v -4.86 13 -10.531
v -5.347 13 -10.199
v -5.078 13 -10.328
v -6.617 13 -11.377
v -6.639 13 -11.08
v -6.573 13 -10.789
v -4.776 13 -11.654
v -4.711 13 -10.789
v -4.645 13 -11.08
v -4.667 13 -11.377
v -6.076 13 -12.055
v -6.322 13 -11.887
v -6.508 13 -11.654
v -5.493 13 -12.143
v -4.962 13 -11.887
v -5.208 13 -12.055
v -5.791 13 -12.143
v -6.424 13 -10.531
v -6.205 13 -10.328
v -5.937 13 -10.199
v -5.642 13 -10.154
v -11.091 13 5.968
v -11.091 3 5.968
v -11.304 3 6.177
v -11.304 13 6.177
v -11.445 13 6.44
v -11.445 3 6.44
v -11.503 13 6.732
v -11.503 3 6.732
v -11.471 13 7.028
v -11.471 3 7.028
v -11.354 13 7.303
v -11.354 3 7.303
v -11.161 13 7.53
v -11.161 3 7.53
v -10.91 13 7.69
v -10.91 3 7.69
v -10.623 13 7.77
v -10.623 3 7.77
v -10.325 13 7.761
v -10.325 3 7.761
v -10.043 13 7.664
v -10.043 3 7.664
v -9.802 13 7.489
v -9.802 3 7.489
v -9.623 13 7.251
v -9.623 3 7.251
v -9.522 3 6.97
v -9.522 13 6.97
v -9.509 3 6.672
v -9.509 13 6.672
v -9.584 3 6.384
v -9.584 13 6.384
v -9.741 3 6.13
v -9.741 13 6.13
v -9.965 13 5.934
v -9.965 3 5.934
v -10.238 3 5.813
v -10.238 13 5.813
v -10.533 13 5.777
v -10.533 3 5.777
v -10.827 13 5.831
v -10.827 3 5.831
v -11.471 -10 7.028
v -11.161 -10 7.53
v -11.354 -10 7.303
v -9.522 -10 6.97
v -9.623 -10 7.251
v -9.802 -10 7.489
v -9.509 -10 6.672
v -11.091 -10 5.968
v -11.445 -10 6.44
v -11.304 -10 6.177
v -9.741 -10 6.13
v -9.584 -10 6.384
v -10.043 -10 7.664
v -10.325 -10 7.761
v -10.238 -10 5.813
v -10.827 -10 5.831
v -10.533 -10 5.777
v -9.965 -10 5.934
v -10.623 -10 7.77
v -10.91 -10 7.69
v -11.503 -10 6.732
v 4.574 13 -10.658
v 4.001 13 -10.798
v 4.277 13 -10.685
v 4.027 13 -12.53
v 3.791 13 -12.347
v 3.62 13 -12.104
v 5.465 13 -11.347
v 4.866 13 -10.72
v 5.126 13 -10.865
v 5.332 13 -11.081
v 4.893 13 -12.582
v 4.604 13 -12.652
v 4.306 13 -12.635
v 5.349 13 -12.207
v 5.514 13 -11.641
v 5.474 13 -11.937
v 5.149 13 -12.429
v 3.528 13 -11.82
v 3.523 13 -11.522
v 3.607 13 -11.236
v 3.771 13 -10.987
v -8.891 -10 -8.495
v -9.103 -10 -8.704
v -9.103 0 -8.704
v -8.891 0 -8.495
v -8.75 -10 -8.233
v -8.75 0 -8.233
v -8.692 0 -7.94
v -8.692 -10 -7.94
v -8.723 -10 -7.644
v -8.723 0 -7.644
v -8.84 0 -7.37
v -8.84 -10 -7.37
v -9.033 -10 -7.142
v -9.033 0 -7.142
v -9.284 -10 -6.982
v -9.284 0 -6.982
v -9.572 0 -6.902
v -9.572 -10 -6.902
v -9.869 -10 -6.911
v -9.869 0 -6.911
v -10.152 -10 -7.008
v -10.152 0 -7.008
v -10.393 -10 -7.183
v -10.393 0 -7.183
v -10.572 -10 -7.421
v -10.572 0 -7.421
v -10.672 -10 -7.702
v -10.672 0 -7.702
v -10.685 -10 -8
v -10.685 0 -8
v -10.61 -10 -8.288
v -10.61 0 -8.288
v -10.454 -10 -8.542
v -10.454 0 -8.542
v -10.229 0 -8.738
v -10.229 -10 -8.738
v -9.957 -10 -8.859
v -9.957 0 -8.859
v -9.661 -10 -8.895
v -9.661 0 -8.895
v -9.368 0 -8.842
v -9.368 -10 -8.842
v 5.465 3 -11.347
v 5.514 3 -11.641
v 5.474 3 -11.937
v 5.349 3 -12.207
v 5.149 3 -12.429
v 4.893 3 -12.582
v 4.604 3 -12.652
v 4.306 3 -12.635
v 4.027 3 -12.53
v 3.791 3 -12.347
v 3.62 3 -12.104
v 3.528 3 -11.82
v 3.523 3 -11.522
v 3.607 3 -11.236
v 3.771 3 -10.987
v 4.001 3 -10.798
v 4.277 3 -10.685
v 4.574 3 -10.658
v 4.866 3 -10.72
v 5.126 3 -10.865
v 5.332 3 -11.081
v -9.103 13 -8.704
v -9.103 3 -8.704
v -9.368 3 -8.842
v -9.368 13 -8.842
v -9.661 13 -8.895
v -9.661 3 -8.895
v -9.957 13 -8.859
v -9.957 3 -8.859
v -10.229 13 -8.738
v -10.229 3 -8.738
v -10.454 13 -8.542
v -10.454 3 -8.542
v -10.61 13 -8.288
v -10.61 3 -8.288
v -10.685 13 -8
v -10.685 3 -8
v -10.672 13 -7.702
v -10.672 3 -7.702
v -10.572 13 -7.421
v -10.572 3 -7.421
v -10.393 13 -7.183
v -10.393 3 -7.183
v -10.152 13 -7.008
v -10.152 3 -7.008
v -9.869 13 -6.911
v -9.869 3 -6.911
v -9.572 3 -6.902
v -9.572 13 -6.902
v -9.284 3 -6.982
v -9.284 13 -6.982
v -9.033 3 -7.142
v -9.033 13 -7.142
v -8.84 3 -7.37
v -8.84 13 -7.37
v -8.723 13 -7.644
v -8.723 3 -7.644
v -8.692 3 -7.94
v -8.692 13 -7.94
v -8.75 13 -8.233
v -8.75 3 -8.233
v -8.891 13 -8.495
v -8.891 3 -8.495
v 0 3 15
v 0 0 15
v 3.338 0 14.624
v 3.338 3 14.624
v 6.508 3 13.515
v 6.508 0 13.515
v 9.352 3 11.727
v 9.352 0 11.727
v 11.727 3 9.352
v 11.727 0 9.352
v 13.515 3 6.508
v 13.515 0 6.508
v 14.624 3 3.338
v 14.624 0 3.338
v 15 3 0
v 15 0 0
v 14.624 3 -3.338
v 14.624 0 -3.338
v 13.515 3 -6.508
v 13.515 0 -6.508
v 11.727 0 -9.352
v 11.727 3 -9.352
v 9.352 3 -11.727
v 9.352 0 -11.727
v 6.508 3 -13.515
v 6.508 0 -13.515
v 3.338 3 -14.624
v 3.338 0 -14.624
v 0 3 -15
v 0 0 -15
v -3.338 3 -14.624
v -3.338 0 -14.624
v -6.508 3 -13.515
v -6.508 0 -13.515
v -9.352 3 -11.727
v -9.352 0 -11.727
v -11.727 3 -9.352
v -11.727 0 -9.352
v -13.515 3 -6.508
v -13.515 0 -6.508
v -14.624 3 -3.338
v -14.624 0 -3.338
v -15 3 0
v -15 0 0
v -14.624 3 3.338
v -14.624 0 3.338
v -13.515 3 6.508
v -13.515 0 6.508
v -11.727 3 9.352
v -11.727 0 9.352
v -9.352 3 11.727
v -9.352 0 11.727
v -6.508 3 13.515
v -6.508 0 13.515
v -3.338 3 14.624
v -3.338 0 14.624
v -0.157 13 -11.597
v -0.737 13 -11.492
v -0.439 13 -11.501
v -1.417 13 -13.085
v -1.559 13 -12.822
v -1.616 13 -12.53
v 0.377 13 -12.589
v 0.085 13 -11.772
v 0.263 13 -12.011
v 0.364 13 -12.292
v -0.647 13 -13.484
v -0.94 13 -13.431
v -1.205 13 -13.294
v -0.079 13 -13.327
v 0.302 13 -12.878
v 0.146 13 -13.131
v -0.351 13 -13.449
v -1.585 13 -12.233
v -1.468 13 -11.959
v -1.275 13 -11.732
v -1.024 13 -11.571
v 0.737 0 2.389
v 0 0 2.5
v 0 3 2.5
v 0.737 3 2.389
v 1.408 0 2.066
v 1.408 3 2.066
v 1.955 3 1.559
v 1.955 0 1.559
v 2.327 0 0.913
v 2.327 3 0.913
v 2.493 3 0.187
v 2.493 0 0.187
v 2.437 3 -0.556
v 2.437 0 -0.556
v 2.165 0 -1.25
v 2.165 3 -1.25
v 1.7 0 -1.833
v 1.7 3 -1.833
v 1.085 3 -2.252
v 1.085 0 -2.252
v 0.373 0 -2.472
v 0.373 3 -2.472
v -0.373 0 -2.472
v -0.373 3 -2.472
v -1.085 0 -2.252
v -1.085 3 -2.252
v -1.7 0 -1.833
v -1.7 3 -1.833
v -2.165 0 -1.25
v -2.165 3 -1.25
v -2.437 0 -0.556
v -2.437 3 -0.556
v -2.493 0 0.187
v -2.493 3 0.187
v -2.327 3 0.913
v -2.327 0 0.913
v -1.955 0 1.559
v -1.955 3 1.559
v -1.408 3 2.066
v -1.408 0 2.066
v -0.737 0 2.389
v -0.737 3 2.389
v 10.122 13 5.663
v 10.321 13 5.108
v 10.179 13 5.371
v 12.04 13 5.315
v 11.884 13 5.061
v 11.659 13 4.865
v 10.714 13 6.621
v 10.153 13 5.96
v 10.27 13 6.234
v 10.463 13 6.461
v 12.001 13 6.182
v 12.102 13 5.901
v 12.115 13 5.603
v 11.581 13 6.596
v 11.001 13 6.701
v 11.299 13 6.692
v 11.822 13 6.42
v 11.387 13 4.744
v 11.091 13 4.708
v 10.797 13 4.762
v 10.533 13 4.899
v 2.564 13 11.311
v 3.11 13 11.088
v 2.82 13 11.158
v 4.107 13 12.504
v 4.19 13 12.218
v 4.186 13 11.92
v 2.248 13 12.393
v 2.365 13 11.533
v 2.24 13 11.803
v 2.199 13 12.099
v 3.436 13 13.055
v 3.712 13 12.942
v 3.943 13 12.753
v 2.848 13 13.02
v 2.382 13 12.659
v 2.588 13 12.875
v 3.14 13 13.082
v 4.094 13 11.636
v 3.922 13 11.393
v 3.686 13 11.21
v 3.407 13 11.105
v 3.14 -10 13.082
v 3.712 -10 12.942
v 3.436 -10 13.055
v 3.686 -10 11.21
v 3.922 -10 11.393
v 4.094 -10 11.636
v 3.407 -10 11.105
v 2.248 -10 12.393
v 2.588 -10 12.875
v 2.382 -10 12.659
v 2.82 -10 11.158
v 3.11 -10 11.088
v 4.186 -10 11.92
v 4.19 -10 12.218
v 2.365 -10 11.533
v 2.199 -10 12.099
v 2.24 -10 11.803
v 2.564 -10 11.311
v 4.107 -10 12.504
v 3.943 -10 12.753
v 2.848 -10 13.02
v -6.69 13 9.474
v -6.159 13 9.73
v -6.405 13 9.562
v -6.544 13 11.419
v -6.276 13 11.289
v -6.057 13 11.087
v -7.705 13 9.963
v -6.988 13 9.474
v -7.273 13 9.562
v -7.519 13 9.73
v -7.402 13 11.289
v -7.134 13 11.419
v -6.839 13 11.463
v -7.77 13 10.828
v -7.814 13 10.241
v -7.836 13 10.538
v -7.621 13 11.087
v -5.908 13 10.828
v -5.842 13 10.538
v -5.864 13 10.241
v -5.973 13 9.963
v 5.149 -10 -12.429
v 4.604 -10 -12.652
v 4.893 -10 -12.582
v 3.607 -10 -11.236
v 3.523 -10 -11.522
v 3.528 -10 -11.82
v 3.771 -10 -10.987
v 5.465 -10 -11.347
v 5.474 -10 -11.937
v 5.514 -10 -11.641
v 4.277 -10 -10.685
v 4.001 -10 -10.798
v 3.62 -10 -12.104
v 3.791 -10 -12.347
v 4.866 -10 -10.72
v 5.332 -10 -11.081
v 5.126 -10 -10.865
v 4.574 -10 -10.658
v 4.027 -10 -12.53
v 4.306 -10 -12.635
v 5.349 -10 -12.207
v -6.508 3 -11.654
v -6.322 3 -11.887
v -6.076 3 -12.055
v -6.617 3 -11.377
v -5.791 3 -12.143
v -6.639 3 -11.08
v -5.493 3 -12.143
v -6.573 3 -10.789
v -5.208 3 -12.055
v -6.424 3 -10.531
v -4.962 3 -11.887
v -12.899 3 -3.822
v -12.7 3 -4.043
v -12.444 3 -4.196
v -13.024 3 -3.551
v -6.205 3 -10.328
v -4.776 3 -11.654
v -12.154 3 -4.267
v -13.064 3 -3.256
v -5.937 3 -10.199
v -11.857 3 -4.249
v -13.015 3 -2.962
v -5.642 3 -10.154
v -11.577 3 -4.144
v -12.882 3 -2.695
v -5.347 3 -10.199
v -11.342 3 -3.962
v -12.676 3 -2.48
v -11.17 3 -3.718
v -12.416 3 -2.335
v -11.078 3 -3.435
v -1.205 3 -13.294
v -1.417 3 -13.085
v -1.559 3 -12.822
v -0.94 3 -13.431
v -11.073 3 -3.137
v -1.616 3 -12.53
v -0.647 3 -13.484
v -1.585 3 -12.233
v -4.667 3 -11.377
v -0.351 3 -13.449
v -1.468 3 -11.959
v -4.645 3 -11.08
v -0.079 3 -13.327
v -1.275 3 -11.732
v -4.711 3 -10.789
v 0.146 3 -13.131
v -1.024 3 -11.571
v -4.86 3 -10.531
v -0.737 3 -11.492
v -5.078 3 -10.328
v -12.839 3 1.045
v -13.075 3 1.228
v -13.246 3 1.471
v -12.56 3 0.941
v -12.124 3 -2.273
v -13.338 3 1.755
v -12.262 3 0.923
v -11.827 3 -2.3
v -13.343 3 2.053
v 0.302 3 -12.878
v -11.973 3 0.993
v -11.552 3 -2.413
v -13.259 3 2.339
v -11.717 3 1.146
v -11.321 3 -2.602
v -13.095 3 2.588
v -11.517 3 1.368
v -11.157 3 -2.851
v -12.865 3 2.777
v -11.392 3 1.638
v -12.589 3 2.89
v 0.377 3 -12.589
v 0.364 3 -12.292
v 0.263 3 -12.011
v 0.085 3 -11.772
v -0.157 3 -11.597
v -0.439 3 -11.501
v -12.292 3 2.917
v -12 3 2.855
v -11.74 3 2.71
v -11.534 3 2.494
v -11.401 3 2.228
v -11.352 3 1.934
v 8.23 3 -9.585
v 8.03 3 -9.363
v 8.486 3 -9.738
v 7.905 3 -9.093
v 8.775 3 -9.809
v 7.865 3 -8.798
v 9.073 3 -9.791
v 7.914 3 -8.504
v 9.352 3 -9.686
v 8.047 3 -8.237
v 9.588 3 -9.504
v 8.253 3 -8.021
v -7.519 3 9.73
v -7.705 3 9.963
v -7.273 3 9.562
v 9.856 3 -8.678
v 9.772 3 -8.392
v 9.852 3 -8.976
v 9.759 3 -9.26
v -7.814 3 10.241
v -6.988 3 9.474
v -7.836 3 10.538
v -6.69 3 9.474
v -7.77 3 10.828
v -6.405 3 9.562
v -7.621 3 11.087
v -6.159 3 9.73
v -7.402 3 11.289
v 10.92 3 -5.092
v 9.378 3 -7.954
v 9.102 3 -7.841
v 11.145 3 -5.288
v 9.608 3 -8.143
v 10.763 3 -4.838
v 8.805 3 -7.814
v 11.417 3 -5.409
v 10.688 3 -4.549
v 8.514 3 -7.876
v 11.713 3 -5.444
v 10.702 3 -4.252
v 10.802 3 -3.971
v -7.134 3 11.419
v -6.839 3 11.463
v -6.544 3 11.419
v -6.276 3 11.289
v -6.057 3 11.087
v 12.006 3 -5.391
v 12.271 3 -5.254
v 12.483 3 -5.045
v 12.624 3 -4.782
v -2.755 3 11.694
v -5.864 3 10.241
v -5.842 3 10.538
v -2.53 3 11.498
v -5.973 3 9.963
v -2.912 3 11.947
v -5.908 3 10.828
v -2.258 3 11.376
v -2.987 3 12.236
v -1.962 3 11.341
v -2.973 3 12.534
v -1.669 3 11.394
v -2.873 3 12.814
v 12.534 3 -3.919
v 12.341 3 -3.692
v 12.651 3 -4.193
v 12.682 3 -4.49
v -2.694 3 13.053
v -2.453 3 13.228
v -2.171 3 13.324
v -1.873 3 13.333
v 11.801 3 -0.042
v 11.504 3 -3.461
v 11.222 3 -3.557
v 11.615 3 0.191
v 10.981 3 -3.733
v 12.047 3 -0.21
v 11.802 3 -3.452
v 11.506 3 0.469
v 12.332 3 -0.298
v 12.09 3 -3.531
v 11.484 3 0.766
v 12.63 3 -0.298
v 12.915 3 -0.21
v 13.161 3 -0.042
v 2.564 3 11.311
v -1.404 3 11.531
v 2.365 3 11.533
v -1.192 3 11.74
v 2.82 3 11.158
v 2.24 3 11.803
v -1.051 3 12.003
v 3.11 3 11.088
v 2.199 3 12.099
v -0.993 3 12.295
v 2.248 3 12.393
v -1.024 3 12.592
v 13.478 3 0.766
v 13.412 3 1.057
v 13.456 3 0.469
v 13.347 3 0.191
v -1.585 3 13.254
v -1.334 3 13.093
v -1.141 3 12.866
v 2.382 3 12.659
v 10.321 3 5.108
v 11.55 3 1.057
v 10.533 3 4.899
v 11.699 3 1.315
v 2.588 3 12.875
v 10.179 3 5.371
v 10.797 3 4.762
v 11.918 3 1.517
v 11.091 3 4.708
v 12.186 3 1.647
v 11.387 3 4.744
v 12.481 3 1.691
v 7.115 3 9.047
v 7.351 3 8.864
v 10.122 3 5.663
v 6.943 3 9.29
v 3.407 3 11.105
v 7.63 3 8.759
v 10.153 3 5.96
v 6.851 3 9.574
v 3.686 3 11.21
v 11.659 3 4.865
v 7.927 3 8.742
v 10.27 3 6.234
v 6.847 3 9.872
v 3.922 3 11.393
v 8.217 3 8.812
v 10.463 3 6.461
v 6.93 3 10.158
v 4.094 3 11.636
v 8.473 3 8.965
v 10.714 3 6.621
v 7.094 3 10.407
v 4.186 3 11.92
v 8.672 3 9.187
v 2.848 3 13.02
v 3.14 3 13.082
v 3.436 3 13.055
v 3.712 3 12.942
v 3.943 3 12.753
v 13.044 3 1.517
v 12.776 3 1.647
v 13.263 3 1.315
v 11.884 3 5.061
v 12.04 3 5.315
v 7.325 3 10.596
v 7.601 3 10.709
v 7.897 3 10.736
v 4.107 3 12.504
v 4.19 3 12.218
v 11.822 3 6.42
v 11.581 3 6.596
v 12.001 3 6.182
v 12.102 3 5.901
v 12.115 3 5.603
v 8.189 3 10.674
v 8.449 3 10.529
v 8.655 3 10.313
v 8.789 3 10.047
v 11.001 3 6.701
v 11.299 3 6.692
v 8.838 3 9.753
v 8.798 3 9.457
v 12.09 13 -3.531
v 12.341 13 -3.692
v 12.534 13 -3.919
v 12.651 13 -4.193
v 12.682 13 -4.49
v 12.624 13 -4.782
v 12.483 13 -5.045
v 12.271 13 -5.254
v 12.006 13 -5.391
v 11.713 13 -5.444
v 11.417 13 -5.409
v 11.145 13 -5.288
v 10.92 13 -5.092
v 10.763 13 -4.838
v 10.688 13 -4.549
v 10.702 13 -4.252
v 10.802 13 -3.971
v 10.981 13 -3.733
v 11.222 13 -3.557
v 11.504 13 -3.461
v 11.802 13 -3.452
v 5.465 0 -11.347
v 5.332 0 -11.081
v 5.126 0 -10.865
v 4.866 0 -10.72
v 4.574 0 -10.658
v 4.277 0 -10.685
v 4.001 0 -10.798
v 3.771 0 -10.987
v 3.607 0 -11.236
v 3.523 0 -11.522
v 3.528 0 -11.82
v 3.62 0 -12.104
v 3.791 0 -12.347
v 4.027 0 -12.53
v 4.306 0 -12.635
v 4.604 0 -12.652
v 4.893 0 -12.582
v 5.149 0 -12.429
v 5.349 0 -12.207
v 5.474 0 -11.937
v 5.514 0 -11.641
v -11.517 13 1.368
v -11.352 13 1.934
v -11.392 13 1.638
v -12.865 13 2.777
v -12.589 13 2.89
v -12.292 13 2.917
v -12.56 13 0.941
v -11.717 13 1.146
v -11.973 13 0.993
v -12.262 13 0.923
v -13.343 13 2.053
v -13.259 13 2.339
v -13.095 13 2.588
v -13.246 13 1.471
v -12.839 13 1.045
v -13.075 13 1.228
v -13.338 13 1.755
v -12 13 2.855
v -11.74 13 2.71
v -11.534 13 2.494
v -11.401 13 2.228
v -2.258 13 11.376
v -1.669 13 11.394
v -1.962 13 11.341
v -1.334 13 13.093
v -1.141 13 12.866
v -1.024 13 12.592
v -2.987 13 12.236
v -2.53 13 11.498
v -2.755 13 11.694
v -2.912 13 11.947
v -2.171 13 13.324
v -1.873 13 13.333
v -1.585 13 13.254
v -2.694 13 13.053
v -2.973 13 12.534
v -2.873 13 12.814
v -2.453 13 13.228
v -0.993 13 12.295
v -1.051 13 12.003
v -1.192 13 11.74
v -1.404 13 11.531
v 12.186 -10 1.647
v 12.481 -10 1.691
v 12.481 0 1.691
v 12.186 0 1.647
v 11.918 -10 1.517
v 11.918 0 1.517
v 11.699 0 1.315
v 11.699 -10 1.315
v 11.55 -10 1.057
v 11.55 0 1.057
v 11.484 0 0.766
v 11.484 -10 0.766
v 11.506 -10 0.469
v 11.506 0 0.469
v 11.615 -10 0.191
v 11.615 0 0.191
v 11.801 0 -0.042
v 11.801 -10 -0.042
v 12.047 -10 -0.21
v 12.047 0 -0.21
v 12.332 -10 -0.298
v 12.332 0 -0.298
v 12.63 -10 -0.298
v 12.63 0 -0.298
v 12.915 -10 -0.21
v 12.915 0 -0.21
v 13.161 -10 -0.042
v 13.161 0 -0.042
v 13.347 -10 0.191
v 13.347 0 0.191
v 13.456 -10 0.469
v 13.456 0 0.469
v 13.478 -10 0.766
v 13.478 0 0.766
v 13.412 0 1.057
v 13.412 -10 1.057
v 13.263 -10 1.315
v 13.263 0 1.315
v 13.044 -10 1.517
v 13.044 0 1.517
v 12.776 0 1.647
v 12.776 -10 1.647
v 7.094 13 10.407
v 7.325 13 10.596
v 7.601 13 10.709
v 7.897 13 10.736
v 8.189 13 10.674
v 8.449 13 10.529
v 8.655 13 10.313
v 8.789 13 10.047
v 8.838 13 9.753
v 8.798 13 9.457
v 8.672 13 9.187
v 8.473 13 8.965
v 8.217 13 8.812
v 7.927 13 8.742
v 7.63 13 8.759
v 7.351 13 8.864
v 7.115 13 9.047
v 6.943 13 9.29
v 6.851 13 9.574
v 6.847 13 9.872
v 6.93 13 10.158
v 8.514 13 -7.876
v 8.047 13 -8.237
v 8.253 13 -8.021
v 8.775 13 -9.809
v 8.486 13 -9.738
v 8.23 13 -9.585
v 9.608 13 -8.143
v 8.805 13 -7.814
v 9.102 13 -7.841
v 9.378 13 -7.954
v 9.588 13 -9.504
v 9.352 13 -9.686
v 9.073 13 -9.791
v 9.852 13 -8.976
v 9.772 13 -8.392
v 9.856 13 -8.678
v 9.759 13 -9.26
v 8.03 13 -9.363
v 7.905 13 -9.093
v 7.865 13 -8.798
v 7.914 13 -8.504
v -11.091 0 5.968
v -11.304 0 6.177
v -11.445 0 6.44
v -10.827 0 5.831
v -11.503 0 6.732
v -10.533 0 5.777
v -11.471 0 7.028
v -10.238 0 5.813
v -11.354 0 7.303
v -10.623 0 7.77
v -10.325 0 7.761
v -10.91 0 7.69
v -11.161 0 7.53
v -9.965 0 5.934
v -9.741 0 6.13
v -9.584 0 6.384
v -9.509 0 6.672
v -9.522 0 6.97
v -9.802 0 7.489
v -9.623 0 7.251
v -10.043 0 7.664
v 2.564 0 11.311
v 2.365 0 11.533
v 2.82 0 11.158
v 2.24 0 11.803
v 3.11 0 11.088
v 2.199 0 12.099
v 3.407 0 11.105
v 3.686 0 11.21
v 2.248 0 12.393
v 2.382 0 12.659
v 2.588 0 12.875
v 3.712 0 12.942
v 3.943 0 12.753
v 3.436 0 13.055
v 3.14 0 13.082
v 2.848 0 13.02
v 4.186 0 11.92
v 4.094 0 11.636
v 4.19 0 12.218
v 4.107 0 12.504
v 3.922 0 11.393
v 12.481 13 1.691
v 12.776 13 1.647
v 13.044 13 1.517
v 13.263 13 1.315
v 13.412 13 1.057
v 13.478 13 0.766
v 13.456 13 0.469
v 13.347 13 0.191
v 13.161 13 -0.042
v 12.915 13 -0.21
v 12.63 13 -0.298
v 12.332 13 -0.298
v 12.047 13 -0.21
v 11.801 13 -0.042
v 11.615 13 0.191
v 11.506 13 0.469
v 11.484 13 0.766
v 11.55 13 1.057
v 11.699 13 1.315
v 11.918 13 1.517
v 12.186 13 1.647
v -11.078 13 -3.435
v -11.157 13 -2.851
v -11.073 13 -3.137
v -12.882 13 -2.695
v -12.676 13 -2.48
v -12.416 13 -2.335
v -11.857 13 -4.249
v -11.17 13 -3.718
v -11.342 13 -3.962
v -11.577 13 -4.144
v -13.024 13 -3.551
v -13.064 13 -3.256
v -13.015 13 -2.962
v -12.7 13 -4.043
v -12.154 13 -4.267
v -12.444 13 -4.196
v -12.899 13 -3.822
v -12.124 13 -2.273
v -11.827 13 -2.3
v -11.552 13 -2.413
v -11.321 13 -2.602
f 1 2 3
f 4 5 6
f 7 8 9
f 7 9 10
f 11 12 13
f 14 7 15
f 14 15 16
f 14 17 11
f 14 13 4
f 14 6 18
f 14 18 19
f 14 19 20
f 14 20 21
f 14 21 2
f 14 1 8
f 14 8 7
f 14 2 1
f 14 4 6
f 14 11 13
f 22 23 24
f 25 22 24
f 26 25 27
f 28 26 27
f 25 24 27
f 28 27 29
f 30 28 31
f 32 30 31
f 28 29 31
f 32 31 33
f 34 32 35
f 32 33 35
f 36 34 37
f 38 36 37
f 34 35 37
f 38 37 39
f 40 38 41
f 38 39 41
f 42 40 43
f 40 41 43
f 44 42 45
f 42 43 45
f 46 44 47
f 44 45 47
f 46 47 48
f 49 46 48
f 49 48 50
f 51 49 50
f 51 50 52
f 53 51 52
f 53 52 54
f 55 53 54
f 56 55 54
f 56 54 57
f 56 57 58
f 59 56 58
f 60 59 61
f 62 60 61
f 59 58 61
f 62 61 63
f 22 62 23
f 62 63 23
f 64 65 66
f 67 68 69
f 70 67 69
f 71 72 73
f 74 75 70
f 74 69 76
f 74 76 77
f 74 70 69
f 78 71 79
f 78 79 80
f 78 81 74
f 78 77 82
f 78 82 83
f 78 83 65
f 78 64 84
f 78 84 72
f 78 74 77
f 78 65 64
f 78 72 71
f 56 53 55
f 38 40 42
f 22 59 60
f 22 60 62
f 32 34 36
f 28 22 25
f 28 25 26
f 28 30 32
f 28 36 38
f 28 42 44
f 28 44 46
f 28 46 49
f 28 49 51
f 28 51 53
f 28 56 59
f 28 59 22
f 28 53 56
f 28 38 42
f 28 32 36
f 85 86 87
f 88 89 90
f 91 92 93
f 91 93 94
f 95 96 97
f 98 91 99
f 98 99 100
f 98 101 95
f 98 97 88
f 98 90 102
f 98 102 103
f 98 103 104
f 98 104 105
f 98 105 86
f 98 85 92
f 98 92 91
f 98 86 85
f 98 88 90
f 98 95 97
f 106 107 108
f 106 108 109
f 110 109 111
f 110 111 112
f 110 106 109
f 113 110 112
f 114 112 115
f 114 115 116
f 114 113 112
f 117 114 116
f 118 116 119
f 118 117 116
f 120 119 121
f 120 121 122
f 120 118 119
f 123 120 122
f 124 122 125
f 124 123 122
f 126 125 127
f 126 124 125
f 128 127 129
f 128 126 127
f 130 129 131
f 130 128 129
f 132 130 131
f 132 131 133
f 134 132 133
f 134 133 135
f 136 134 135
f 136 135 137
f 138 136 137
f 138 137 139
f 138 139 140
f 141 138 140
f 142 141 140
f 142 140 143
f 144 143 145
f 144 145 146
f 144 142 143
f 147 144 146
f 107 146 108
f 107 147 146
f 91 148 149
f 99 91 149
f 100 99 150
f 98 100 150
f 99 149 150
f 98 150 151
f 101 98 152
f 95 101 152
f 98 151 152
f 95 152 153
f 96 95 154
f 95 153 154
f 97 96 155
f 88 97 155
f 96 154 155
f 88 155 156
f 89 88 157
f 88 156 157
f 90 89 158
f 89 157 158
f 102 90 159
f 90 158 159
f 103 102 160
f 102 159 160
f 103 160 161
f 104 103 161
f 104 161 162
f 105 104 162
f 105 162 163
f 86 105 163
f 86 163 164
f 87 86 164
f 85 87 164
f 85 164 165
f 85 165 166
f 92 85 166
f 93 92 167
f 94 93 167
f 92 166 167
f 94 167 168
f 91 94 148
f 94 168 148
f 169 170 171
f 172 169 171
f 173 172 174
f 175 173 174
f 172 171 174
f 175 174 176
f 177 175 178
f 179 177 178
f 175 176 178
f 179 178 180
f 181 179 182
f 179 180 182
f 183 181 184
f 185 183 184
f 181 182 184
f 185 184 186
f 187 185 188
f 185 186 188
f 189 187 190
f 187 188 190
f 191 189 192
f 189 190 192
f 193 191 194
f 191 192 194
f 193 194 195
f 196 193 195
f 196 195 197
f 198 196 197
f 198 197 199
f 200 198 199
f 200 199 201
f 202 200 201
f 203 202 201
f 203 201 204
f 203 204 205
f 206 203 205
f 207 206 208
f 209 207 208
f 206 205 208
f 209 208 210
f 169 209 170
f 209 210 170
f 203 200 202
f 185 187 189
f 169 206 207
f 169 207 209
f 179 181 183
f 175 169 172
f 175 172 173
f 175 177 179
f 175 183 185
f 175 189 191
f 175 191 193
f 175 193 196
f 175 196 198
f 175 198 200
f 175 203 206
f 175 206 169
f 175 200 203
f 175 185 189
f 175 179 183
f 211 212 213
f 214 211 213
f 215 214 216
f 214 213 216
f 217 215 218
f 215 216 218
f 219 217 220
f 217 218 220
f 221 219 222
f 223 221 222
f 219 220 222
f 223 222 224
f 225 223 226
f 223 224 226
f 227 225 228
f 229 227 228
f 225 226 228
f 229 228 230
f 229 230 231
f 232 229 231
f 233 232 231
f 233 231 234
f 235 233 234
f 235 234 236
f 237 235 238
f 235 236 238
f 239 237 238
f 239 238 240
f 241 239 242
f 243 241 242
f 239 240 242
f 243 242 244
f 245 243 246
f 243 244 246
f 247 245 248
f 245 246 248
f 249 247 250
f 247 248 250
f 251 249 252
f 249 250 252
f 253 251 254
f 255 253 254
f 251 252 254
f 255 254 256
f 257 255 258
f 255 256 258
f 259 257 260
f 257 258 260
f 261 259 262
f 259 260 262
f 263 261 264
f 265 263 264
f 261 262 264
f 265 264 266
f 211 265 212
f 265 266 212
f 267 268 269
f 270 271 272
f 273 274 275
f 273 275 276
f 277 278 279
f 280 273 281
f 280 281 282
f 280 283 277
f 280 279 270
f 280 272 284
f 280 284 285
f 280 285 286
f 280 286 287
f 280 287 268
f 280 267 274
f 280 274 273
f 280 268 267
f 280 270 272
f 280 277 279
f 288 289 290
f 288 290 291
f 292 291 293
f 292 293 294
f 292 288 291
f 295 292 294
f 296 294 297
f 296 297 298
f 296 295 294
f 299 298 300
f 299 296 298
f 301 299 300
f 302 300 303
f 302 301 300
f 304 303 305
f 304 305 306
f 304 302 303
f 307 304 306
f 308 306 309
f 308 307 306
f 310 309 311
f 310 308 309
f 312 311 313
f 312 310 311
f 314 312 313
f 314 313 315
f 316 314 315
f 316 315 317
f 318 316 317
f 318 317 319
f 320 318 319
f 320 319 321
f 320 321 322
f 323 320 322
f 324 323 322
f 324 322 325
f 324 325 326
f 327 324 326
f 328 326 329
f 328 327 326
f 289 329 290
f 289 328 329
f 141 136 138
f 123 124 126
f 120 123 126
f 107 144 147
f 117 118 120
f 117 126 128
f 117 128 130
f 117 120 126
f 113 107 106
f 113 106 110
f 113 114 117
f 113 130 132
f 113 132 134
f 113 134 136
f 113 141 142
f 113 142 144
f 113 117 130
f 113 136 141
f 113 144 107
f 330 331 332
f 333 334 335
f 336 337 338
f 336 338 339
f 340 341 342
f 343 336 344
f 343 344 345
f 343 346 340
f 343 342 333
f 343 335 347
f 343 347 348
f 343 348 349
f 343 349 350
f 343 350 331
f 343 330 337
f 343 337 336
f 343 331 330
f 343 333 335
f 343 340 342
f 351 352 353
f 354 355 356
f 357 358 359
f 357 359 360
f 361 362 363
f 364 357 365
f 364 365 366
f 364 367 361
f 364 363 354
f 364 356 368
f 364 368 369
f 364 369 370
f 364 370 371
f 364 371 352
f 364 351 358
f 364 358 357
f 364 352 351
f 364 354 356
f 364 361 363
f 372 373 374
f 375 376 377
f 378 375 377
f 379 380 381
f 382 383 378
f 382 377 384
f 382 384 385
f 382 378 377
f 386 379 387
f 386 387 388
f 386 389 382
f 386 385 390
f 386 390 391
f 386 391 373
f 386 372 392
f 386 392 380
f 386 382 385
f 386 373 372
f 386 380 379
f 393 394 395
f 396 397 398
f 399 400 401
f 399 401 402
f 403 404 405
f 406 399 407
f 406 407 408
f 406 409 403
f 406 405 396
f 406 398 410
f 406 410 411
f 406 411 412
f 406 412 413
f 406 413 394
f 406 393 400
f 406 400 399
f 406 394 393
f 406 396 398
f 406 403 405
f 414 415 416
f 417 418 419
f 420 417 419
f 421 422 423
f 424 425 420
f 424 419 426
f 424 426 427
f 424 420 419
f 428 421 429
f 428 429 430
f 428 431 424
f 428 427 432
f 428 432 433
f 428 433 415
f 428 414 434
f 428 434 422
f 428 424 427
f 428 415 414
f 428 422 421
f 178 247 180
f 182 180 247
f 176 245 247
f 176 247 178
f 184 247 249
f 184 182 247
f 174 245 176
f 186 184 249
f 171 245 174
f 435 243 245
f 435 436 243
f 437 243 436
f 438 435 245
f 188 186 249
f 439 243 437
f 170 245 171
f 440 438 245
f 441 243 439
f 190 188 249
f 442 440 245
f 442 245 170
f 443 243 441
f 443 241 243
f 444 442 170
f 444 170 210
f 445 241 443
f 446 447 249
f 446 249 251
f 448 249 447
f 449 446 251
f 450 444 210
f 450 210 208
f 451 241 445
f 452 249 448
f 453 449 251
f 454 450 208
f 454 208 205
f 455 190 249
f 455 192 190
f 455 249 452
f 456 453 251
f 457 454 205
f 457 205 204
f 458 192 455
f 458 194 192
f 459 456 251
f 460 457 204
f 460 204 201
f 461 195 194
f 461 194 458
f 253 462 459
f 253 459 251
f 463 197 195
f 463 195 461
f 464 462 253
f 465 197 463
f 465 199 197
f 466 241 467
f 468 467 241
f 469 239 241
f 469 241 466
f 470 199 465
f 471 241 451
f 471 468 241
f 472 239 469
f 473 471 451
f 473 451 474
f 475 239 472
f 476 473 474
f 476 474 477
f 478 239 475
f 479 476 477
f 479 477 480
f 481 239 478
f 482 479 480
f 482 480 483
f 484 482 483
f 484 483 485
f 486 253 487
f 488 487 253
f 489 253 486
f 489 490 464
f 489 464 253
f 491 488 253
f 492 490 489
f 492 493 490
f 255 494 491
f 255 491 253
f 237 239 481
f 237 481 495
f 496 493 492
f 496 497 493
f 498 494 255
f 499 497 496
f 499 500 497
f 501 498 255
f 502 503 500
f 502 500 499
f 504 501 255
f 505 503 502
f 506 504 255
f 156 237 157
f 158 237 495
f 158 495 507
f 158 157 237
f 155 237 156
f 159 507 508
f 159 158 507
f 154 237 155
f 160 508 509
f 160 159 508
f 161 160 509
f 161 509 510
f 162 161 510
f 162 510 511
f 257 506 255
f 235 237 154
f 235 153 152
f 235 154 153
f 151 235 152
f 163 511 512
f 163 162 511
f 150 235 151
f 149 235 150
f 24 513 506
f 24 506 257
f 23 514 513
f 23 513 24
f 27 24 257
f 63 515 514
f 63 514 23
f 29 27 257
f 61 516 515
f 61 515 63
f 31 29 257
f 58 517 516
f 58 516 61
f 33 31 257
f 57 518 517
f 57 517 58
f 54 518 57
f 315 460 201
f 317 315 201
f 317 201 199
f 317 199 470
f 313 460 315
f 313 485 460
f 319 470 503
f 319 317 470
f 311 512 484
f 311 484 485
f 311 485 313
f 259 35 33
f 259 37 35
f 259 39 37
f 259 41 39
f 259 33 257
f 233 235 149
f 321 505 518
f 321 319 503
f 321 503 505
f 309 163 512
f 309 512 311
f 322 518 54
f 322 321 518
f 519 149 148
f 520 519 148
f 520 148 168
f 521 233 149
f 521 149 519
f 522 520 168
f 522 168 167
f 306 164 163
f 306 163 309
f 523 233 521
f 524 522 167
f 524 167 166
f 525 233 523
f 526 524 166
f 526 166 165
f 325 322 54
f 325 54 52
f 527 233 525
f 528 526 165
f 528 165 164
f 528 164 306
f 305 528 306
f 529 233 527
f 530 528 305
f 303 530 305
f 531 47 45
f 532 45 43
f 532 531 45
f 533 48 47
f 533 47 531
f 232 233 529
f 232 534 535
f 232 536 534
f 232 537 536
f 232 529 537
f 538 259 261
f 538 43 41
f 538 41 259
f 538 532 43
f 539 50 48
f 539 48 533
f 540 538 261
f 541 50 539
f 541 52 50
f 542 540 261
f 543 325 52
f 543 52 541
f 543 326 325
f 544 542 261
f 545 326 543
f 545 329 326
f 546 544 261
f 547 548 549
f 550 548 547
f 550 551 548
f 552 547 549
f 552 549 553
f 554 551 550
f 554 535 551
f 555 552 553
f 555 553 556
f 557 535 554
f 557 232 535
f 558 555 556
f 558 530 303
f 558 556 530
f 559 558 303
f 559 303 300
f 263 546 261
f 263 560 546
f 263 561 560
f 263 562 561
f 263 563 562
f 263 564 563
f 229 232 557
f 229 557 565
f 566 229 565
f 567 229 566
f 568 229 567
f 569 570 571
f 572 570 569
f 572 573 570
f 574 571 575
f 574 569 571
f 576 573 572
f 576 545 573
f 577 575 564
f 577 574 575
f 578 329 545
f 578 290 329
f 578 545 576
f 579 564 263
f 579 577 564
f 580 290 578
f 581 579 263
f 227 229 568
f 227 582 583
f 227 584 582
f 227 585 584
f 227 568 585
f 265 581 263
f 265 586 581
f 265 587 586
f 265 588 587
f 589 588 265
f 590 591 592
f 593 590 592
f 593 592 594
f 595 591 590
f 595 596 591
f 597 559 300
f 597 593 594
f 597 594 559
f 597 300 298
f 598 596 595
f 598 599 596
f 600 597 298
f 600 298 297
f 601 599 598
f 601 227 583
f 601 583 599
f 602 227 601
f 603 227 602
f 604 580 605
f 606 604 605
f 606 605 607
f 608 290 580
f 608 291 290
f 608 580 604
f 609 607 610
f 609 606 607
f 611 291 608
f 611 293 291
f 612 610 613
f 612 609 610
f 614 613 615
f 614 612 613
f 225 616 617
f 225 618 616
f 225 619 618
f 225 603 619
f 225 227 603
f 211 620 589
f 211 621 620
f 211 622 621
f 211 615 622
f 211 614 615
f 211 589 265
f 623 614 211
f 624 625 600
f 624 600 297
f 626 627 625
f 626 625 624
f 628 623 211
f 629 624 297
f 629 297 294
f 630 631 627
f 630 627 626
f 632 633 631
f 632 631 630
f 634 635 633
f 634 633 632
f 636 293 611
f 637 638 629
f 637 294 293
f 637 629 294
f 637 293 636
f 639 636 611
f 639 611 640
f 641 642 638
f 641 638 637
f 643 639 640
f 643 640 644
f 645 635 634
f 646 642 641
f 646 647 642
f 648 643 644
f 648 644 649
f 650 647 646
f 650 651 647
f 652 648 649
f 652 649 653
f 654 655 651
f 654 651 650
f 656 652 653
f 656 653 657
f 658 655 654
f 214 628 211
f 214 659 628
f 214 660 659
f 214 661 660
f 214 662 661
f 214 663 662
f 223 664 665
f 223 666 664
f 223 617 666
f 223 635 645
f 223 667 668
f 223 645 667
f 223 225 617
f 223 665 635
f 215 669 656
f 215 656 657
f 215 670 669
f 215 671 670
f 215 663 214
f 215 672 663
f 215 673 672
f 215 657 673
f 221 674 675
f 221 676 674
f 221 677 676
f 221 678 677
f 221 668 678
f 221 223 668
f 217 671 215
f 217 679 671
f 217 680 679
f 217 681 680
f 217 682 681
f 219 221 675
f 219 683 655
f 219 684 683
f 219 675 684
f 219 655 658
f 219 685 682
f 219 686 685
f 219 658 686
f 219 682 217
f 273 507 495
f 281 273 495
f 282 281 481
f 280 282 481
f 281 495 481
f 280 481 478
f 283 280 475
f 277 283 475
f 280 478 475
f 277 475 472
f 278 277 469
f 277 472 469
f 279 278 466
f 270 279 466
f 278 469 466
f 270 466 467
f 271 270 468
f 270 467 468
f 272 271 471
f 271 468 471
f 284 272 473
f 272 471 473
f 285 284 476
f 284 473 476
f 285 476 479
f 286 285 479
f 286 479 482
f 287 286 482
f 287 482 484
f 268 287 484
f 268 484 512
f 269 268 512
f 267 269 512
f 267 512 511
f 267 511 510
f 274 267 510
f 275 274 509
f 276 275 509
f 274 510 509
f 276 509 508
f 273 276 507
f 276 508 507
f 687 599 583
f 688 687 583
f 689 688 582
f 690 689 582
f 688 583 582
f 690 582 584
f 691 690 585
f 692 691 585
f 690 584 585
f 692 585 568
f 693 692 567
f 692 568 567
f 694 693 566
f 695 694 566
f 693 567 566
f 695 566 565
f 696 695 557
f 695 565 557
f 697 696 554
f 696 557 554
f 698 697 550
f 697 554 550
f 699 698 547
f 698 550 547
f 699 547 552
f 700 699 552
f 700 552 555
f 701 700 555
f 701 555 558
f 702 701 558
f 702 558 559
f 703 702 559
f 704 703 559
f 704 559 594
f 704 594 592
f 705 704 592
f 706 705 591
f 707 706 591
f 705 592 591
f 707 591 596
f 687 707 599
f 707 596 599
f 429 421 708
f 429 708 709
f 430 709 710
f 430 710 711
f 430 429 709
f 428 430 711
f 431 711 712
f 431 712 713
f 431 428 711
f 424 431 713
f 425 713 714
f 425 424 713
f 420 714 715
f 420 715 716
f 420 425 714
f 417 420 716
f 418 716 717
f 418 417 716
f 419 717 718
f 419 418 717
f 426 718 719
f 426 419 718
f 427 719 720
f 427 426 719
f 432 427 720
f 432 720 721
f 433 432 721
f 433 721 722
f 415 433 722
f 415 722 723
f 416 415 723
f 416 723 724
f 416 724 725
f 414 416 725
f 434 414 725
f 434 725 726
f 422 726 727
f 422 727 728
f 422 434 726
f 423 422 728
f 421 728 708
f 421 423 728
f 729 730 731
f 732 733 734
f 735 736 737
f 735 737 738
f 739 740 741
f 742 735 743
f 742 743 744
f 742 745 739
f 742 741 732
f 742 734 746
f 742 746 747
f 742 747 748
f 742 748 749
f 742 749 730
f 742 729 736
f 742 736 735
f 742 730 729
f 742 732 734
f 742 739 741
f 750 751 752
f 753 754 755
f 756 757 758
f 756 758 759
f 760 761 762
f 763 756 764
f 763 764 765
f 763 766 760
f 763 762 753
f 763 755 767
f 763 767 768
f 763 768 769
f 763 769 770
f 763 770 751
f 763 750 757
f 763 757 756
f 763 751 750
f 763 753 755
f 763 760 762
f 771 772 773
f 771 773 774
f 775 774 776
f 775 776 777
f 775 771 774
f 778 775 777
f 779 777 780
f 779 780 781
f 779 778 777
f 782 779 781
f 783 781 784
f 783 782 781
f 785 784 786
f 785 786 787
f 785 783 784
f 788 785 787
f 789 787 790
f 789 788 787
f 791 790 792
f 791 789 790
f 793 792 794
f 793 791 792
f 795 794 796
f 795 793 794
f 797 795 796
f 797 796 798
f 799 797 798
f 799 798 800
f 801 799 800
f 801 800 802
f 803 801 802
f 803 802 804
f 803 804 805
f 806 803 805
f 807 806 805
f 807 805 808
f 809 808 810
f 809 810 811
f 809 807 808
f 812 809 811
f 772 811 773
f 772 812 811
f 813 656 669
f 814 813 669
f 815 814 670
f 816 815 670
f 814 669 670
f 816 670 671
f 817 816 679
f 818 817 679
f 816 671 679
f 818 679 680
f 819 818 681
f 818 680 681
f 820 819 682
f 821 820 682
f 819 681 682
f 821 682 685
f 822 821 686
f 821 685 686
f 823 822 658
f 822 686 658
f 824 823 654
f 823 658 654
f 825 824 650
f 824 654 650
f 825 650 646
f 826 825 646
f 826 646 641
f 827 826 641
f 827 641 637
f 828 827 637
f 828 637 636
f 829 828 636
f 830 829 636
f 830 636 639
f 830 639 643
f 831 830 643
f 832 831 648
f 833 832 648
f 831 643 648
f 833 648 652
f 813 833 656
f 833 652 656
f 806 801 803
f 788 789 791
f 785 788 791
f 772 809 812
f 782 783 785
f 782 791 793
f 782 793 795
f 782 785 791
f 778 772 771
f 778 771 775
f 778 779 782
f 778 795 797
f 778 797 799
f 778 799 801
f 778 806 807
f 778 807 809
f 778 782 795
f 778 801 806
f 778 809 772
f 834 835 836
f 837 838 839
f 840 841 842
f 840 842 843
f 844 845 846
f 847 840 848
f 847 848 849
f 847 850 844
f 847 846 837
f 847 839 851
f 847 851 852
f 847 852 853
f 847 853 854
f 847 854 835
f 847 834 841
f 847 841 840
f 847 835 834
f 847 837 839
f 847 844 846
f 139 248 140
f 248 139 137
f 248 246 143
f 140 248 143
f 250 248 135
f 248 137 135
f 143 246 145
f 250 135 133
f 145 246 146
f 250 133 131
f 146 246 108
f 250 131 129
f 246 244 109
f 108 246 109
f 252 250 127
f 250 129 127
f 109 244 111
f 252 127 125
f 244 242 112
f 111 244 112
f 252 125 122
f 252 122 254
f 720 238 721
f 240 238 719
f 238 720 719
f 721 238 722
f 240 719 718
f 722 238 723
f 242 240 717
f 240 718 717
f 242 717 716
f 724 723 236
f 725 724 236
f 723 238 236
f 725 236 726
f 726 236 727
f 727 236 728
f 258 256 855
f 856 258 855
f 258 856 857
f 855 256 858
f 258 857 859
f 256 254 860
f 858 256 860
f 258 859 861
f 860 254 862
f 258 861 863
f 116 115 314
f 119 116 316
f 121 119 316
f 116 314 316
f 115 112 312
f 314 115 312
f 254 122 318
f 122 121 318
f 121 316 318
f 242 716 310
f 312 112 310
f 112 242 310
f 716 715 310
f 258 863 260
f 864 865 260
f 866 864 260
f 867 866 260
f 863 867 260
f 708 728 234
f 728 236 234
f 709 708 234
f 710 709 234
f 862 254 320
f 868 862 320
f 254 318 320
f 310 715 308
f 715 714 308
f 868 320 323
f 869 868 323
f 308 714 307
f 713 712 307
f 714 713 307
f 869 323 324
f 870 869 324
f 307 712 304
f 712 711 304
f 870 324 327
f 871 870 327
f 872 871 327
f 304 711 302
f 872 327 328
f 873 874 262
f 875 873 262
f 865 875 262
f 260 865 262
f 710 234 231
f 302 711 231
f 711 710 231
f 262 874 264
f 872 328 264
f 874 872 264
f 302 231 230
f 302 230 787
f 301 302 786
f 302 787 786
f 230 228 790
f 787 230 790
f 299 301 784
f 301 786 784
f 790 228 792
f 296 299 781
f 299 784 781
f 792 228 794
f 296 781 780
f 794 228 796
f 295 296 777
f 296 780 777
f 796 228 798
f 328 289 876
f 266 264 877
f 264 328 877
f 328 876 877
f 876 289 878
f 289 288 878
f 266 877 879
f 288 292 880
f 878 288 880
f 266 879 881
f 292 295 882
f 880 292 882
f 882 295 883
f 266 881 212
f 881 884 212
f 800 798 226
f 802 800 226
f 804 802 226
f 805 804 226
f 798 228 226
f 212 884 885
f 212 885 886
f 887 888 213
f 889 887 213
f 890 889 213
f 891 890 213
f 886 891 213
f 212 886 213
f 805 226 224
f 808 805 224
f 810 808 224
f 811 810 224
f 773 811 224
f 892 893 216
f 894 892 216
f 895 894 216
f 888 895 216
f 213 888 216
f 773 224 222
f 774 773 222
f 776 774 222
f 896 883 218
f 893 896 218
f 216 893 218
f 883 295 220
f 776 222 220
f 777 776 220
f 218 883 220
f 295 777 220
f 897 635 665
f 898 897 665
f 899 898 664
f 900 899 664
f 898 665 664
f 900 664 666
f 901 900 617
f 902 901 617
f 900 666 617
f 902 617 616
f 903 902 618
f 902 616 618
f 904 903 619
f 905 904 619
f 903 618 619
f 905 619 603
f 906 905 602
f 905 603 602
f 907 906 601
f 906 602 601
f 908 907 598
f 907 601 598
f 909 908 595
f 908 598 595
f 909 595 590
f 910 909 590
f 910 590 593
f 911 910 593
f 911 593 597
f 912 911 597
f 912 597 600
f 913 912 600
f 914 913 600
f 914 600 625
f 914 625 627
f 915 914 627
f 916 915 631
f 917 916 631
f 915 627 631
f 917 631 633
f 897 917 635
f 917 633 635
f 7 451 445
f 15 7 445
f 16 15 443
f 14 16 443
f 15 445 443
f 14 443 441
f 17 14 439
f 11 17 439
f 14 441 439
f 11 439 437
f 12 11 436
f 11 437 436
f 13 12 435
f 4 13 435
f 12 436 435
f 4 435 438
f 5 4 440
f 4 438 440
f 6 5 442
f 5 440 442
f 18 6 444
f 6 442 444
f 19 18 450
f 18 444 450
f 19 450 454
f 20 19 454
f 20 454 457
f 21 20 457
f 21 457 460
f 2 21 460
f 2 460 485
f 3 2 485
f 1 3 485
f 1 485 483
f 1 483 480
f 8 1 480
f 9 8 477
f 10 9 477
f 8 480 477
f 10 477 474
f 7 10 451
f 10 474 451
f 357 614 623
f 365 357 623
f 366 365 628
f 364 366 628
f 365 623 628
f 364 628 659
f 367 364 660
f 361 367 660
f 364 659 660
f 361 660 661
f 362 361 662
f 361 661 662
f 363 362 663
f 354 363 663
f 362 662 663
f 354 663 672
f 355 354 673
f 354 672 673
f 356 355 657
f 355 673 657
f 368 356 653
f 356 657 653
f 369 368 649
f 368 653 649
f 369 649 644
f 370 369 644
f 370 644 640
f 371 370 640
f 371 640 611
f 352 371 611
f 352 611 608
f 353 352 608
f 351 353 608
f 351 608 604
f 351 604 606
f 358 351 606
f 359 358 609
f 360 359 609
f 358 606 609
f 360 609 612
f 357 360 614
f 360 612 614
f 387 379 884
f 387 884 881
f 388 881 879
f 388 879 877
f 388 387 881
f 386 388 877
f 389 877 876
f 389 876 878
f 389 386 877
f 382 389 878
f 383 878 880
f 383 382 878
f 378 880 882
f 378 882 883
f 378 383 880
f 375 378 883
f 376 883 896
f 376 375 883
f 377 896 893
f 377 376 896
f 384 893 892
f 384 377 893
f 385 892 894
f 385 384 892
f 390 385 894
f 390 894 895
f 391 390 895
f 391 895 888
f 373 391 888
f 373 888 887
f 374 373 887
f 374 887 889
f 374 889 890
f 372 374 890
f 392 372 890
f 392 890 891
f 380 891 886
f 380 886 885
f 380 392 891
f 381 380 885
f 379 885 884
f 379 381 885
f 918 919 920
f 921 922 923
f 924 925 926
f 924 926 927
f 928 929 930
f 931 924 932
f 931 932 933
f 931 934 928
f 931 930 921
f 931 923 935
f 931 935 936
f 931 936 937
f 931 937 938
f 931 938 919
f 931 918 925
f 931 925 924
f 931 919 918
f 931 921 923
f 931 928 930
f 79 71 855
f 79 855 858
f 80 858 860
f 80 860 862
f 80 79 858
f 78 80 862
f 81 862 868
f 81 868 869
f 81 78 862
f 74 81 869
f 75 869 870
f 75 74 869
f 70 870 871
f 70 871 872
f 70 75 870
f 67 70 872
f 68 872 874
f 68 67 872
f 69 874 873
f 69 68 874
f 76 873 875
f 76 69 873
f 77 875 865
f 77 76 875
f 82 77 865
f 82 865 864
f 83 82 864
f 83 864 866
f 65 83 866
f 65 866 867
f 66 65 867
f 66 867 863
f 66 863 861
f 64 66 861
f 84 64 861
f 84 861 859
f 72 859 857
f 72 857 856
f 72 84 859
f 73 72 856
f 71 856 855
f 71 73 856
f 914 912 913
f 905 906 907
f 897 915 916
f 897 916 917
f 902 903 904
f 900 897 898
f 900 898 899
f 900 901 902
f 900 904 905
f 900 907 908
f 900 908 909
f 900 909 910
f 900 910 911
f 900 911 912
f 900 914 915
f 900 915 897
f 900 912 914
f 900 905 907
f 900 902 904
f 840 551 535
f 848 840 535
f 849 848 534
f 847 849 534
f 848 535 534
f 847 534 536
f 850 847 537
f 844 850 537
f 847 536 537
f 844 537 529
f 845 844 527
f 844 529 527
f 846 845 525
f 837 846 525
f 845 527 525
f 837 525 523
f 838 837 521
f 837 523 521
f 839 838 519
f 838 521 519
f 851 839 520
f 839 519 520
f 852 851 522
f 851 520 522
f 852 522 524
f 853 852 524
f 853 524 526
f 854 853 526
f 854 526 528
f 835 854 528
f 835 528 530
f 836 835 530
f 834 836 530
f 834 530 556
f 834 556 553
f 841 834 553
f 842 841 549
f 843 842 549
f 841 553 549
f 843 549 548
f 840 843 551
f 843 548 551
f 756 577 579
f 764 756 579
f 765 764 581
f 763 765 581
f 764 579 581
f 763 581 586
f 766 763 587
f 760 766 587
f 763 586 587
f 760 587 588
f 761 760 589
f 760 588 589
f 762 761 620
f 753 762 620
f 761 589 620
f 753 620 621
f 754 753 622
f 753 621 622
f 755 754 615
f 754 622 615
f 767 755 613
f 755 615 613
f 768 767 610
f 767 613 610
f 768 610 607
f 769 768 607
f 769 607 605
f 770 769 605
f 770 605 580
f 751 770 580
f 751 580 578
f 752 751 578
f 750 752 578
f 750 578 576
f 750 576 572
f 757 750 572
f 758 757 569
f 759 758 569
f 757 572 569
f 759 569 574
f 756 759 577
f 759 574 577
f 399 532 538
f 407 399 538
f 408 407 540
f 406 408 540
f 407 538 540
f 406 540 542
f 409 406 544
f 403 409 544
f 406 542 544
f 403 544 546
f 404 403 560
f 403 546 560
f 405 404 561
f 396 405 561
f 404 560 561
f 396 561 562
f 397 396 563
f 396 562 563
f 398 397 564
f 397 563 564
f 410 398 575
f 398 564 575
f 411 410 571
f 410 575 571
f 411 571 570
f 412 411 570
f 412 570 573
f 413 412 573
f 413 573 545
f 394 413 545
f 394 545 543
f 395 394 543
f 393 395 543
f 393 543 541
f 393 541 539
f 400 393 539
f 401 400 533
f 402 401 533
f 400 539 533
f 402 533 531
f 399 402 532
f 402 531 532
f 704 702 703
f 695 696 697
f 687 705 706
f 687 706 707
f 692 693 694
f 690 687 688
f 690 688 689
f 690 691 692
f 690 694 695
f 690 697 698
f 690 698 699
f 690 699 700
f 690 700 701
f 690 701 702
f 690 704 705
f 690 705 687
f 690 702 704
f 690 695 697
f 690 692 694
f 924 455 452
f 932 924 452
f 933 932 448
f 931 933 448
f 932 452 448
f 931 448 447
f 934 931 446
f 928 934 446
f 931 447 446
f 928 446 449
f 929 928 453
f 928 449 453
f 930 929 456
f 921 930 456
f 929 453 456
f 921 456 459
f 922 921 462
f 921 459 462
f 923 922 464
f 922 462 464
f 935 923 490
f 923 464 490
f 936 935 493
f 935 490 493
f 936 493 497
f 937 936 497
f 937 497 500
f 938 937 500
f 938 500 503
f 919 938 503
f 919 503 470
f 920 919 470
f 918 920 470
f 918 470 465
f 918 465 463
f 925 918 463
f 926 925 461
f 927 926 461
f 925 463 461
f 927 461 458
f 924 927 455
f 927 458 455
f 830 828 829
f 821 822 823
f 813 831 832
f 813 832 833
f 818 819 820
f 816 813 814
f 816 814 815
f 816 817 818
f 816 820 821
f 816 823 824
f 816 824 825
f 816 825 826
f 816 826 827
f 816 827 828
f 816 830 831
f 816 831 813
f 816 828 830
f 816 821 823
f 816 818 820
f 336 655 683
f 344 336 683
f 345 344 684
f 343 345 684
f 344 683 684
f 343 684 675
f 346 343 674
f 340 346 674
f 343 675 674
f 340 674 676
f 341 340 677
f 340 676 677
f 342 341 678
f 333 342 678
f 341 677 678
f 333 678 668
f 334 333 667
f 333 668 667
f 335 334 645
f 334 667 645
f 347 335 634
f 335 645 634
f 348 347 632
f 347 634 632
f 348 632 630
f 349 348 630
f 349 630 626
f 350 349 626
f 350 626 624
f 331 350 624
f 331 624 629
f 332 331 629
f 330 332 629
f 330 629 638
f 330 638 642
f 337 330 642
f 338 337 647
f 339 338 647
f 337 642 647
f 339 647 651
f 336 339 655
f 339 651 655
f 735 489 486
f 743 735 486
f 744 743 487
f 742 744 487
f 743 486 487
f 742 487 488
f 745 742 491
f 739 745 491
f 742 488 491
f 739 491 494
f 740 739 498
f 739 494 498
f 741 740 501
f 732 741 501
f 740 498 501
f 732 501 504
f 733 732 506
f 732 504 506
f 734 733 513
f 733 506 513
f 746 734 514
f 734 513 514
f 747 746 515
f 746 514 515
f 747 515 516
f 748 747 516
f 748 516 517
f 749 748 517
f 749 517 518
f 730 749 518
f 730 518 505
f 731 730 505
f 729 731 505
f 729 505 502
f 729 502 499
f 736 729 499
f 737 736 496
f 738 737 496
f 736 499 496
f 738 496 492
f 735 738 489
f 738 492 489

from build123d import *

# Parameters (mm, degrees)
SKETCH_1_R               = 15
SKETCH_1_R_2             = 2.5
EXTRUDE_1_DEPTH          = 3
SKETCH_2_R               = 1
EXTRUDE_2_DEPTH          = 10
PATTERN_CIRCULAR_1_COUNT = 15
EXTRUDE_START            = 10
SKETCH_3_R               = 1
EXTRUDE_3_DEPTH          = 10
PATTERN_CIRCULAR_2_COUNT = 5


with BuildPart() as part:
    # 草圖1 → 填料-伸長1 (new body)
    with BuildSketch(Plane(origin=(0, 0, 0), x_dir=(1, 0, 0), z_dir=(0, 1, 0))):
        with Locations(Location((0, 0, 0), (0, 0, 270))):
            Circle(SKETCH_1_R)
        with Locations(Location((0, 0, 0), (0, 0, 270))):
            Circle(SKETCH_1_R_2, mode=Mode.SUBTRACT)
    extrude(amount=EXTRUDE_1_DEPTH)

    # 草圖2 → 填料-伸長2 (add)
    with BuildSketch(Plane(origin=(0, 3, 0), x_dir=(1, 0, 0), z_dir=(0, 1, 0))):
        with Locations(Location((12.4808724, -0.691248248, 0), (0, 0, 270))):
            Circle(SKETCH_2_R)
    extrude_2 = extrude(amount=EXTRUDE_2_DEPTH)

    # 環狀複製排列1: 填料-伸長2 ×15 about axis
    pattern_circular_1_axis = Axis((0, 0, 0), (0, 1, 0))
    for i in range(1, PATTERN_CIRCULAR_1_COUNT):
        add(extrude_2.rotate(pattern_circular_1_axis, i * 360 / PATTERN_CIRCULAR_1_COUNT))

    # 草圖3 → 填料-伸長3 (add)
    with BuildSketch(Plane.XZ.offset(EXTRUDE_START)):
        with Locations(Location((12.4808724, 0.691248248, 0), (0, 0, 90))):
            Circle(SKETCH_3_R)
    extrude_3 = extrude(amount=-EXTRUDE_3_DEPTH)

    # 環狀複製排列2: 填料-伸長3 ×5 about axis
    pattern_circular_2_axis = Axis((0, 0, 0), (0, 1, 0))
    for i in range(1, PATTERN_CIRCULAR_2_COUNT):
        add(extrude_3.rotate(pattern_circular_2_axis, i * 360 / PATTERN_CIRCULAR_2_COUNT))


solid = part.part
